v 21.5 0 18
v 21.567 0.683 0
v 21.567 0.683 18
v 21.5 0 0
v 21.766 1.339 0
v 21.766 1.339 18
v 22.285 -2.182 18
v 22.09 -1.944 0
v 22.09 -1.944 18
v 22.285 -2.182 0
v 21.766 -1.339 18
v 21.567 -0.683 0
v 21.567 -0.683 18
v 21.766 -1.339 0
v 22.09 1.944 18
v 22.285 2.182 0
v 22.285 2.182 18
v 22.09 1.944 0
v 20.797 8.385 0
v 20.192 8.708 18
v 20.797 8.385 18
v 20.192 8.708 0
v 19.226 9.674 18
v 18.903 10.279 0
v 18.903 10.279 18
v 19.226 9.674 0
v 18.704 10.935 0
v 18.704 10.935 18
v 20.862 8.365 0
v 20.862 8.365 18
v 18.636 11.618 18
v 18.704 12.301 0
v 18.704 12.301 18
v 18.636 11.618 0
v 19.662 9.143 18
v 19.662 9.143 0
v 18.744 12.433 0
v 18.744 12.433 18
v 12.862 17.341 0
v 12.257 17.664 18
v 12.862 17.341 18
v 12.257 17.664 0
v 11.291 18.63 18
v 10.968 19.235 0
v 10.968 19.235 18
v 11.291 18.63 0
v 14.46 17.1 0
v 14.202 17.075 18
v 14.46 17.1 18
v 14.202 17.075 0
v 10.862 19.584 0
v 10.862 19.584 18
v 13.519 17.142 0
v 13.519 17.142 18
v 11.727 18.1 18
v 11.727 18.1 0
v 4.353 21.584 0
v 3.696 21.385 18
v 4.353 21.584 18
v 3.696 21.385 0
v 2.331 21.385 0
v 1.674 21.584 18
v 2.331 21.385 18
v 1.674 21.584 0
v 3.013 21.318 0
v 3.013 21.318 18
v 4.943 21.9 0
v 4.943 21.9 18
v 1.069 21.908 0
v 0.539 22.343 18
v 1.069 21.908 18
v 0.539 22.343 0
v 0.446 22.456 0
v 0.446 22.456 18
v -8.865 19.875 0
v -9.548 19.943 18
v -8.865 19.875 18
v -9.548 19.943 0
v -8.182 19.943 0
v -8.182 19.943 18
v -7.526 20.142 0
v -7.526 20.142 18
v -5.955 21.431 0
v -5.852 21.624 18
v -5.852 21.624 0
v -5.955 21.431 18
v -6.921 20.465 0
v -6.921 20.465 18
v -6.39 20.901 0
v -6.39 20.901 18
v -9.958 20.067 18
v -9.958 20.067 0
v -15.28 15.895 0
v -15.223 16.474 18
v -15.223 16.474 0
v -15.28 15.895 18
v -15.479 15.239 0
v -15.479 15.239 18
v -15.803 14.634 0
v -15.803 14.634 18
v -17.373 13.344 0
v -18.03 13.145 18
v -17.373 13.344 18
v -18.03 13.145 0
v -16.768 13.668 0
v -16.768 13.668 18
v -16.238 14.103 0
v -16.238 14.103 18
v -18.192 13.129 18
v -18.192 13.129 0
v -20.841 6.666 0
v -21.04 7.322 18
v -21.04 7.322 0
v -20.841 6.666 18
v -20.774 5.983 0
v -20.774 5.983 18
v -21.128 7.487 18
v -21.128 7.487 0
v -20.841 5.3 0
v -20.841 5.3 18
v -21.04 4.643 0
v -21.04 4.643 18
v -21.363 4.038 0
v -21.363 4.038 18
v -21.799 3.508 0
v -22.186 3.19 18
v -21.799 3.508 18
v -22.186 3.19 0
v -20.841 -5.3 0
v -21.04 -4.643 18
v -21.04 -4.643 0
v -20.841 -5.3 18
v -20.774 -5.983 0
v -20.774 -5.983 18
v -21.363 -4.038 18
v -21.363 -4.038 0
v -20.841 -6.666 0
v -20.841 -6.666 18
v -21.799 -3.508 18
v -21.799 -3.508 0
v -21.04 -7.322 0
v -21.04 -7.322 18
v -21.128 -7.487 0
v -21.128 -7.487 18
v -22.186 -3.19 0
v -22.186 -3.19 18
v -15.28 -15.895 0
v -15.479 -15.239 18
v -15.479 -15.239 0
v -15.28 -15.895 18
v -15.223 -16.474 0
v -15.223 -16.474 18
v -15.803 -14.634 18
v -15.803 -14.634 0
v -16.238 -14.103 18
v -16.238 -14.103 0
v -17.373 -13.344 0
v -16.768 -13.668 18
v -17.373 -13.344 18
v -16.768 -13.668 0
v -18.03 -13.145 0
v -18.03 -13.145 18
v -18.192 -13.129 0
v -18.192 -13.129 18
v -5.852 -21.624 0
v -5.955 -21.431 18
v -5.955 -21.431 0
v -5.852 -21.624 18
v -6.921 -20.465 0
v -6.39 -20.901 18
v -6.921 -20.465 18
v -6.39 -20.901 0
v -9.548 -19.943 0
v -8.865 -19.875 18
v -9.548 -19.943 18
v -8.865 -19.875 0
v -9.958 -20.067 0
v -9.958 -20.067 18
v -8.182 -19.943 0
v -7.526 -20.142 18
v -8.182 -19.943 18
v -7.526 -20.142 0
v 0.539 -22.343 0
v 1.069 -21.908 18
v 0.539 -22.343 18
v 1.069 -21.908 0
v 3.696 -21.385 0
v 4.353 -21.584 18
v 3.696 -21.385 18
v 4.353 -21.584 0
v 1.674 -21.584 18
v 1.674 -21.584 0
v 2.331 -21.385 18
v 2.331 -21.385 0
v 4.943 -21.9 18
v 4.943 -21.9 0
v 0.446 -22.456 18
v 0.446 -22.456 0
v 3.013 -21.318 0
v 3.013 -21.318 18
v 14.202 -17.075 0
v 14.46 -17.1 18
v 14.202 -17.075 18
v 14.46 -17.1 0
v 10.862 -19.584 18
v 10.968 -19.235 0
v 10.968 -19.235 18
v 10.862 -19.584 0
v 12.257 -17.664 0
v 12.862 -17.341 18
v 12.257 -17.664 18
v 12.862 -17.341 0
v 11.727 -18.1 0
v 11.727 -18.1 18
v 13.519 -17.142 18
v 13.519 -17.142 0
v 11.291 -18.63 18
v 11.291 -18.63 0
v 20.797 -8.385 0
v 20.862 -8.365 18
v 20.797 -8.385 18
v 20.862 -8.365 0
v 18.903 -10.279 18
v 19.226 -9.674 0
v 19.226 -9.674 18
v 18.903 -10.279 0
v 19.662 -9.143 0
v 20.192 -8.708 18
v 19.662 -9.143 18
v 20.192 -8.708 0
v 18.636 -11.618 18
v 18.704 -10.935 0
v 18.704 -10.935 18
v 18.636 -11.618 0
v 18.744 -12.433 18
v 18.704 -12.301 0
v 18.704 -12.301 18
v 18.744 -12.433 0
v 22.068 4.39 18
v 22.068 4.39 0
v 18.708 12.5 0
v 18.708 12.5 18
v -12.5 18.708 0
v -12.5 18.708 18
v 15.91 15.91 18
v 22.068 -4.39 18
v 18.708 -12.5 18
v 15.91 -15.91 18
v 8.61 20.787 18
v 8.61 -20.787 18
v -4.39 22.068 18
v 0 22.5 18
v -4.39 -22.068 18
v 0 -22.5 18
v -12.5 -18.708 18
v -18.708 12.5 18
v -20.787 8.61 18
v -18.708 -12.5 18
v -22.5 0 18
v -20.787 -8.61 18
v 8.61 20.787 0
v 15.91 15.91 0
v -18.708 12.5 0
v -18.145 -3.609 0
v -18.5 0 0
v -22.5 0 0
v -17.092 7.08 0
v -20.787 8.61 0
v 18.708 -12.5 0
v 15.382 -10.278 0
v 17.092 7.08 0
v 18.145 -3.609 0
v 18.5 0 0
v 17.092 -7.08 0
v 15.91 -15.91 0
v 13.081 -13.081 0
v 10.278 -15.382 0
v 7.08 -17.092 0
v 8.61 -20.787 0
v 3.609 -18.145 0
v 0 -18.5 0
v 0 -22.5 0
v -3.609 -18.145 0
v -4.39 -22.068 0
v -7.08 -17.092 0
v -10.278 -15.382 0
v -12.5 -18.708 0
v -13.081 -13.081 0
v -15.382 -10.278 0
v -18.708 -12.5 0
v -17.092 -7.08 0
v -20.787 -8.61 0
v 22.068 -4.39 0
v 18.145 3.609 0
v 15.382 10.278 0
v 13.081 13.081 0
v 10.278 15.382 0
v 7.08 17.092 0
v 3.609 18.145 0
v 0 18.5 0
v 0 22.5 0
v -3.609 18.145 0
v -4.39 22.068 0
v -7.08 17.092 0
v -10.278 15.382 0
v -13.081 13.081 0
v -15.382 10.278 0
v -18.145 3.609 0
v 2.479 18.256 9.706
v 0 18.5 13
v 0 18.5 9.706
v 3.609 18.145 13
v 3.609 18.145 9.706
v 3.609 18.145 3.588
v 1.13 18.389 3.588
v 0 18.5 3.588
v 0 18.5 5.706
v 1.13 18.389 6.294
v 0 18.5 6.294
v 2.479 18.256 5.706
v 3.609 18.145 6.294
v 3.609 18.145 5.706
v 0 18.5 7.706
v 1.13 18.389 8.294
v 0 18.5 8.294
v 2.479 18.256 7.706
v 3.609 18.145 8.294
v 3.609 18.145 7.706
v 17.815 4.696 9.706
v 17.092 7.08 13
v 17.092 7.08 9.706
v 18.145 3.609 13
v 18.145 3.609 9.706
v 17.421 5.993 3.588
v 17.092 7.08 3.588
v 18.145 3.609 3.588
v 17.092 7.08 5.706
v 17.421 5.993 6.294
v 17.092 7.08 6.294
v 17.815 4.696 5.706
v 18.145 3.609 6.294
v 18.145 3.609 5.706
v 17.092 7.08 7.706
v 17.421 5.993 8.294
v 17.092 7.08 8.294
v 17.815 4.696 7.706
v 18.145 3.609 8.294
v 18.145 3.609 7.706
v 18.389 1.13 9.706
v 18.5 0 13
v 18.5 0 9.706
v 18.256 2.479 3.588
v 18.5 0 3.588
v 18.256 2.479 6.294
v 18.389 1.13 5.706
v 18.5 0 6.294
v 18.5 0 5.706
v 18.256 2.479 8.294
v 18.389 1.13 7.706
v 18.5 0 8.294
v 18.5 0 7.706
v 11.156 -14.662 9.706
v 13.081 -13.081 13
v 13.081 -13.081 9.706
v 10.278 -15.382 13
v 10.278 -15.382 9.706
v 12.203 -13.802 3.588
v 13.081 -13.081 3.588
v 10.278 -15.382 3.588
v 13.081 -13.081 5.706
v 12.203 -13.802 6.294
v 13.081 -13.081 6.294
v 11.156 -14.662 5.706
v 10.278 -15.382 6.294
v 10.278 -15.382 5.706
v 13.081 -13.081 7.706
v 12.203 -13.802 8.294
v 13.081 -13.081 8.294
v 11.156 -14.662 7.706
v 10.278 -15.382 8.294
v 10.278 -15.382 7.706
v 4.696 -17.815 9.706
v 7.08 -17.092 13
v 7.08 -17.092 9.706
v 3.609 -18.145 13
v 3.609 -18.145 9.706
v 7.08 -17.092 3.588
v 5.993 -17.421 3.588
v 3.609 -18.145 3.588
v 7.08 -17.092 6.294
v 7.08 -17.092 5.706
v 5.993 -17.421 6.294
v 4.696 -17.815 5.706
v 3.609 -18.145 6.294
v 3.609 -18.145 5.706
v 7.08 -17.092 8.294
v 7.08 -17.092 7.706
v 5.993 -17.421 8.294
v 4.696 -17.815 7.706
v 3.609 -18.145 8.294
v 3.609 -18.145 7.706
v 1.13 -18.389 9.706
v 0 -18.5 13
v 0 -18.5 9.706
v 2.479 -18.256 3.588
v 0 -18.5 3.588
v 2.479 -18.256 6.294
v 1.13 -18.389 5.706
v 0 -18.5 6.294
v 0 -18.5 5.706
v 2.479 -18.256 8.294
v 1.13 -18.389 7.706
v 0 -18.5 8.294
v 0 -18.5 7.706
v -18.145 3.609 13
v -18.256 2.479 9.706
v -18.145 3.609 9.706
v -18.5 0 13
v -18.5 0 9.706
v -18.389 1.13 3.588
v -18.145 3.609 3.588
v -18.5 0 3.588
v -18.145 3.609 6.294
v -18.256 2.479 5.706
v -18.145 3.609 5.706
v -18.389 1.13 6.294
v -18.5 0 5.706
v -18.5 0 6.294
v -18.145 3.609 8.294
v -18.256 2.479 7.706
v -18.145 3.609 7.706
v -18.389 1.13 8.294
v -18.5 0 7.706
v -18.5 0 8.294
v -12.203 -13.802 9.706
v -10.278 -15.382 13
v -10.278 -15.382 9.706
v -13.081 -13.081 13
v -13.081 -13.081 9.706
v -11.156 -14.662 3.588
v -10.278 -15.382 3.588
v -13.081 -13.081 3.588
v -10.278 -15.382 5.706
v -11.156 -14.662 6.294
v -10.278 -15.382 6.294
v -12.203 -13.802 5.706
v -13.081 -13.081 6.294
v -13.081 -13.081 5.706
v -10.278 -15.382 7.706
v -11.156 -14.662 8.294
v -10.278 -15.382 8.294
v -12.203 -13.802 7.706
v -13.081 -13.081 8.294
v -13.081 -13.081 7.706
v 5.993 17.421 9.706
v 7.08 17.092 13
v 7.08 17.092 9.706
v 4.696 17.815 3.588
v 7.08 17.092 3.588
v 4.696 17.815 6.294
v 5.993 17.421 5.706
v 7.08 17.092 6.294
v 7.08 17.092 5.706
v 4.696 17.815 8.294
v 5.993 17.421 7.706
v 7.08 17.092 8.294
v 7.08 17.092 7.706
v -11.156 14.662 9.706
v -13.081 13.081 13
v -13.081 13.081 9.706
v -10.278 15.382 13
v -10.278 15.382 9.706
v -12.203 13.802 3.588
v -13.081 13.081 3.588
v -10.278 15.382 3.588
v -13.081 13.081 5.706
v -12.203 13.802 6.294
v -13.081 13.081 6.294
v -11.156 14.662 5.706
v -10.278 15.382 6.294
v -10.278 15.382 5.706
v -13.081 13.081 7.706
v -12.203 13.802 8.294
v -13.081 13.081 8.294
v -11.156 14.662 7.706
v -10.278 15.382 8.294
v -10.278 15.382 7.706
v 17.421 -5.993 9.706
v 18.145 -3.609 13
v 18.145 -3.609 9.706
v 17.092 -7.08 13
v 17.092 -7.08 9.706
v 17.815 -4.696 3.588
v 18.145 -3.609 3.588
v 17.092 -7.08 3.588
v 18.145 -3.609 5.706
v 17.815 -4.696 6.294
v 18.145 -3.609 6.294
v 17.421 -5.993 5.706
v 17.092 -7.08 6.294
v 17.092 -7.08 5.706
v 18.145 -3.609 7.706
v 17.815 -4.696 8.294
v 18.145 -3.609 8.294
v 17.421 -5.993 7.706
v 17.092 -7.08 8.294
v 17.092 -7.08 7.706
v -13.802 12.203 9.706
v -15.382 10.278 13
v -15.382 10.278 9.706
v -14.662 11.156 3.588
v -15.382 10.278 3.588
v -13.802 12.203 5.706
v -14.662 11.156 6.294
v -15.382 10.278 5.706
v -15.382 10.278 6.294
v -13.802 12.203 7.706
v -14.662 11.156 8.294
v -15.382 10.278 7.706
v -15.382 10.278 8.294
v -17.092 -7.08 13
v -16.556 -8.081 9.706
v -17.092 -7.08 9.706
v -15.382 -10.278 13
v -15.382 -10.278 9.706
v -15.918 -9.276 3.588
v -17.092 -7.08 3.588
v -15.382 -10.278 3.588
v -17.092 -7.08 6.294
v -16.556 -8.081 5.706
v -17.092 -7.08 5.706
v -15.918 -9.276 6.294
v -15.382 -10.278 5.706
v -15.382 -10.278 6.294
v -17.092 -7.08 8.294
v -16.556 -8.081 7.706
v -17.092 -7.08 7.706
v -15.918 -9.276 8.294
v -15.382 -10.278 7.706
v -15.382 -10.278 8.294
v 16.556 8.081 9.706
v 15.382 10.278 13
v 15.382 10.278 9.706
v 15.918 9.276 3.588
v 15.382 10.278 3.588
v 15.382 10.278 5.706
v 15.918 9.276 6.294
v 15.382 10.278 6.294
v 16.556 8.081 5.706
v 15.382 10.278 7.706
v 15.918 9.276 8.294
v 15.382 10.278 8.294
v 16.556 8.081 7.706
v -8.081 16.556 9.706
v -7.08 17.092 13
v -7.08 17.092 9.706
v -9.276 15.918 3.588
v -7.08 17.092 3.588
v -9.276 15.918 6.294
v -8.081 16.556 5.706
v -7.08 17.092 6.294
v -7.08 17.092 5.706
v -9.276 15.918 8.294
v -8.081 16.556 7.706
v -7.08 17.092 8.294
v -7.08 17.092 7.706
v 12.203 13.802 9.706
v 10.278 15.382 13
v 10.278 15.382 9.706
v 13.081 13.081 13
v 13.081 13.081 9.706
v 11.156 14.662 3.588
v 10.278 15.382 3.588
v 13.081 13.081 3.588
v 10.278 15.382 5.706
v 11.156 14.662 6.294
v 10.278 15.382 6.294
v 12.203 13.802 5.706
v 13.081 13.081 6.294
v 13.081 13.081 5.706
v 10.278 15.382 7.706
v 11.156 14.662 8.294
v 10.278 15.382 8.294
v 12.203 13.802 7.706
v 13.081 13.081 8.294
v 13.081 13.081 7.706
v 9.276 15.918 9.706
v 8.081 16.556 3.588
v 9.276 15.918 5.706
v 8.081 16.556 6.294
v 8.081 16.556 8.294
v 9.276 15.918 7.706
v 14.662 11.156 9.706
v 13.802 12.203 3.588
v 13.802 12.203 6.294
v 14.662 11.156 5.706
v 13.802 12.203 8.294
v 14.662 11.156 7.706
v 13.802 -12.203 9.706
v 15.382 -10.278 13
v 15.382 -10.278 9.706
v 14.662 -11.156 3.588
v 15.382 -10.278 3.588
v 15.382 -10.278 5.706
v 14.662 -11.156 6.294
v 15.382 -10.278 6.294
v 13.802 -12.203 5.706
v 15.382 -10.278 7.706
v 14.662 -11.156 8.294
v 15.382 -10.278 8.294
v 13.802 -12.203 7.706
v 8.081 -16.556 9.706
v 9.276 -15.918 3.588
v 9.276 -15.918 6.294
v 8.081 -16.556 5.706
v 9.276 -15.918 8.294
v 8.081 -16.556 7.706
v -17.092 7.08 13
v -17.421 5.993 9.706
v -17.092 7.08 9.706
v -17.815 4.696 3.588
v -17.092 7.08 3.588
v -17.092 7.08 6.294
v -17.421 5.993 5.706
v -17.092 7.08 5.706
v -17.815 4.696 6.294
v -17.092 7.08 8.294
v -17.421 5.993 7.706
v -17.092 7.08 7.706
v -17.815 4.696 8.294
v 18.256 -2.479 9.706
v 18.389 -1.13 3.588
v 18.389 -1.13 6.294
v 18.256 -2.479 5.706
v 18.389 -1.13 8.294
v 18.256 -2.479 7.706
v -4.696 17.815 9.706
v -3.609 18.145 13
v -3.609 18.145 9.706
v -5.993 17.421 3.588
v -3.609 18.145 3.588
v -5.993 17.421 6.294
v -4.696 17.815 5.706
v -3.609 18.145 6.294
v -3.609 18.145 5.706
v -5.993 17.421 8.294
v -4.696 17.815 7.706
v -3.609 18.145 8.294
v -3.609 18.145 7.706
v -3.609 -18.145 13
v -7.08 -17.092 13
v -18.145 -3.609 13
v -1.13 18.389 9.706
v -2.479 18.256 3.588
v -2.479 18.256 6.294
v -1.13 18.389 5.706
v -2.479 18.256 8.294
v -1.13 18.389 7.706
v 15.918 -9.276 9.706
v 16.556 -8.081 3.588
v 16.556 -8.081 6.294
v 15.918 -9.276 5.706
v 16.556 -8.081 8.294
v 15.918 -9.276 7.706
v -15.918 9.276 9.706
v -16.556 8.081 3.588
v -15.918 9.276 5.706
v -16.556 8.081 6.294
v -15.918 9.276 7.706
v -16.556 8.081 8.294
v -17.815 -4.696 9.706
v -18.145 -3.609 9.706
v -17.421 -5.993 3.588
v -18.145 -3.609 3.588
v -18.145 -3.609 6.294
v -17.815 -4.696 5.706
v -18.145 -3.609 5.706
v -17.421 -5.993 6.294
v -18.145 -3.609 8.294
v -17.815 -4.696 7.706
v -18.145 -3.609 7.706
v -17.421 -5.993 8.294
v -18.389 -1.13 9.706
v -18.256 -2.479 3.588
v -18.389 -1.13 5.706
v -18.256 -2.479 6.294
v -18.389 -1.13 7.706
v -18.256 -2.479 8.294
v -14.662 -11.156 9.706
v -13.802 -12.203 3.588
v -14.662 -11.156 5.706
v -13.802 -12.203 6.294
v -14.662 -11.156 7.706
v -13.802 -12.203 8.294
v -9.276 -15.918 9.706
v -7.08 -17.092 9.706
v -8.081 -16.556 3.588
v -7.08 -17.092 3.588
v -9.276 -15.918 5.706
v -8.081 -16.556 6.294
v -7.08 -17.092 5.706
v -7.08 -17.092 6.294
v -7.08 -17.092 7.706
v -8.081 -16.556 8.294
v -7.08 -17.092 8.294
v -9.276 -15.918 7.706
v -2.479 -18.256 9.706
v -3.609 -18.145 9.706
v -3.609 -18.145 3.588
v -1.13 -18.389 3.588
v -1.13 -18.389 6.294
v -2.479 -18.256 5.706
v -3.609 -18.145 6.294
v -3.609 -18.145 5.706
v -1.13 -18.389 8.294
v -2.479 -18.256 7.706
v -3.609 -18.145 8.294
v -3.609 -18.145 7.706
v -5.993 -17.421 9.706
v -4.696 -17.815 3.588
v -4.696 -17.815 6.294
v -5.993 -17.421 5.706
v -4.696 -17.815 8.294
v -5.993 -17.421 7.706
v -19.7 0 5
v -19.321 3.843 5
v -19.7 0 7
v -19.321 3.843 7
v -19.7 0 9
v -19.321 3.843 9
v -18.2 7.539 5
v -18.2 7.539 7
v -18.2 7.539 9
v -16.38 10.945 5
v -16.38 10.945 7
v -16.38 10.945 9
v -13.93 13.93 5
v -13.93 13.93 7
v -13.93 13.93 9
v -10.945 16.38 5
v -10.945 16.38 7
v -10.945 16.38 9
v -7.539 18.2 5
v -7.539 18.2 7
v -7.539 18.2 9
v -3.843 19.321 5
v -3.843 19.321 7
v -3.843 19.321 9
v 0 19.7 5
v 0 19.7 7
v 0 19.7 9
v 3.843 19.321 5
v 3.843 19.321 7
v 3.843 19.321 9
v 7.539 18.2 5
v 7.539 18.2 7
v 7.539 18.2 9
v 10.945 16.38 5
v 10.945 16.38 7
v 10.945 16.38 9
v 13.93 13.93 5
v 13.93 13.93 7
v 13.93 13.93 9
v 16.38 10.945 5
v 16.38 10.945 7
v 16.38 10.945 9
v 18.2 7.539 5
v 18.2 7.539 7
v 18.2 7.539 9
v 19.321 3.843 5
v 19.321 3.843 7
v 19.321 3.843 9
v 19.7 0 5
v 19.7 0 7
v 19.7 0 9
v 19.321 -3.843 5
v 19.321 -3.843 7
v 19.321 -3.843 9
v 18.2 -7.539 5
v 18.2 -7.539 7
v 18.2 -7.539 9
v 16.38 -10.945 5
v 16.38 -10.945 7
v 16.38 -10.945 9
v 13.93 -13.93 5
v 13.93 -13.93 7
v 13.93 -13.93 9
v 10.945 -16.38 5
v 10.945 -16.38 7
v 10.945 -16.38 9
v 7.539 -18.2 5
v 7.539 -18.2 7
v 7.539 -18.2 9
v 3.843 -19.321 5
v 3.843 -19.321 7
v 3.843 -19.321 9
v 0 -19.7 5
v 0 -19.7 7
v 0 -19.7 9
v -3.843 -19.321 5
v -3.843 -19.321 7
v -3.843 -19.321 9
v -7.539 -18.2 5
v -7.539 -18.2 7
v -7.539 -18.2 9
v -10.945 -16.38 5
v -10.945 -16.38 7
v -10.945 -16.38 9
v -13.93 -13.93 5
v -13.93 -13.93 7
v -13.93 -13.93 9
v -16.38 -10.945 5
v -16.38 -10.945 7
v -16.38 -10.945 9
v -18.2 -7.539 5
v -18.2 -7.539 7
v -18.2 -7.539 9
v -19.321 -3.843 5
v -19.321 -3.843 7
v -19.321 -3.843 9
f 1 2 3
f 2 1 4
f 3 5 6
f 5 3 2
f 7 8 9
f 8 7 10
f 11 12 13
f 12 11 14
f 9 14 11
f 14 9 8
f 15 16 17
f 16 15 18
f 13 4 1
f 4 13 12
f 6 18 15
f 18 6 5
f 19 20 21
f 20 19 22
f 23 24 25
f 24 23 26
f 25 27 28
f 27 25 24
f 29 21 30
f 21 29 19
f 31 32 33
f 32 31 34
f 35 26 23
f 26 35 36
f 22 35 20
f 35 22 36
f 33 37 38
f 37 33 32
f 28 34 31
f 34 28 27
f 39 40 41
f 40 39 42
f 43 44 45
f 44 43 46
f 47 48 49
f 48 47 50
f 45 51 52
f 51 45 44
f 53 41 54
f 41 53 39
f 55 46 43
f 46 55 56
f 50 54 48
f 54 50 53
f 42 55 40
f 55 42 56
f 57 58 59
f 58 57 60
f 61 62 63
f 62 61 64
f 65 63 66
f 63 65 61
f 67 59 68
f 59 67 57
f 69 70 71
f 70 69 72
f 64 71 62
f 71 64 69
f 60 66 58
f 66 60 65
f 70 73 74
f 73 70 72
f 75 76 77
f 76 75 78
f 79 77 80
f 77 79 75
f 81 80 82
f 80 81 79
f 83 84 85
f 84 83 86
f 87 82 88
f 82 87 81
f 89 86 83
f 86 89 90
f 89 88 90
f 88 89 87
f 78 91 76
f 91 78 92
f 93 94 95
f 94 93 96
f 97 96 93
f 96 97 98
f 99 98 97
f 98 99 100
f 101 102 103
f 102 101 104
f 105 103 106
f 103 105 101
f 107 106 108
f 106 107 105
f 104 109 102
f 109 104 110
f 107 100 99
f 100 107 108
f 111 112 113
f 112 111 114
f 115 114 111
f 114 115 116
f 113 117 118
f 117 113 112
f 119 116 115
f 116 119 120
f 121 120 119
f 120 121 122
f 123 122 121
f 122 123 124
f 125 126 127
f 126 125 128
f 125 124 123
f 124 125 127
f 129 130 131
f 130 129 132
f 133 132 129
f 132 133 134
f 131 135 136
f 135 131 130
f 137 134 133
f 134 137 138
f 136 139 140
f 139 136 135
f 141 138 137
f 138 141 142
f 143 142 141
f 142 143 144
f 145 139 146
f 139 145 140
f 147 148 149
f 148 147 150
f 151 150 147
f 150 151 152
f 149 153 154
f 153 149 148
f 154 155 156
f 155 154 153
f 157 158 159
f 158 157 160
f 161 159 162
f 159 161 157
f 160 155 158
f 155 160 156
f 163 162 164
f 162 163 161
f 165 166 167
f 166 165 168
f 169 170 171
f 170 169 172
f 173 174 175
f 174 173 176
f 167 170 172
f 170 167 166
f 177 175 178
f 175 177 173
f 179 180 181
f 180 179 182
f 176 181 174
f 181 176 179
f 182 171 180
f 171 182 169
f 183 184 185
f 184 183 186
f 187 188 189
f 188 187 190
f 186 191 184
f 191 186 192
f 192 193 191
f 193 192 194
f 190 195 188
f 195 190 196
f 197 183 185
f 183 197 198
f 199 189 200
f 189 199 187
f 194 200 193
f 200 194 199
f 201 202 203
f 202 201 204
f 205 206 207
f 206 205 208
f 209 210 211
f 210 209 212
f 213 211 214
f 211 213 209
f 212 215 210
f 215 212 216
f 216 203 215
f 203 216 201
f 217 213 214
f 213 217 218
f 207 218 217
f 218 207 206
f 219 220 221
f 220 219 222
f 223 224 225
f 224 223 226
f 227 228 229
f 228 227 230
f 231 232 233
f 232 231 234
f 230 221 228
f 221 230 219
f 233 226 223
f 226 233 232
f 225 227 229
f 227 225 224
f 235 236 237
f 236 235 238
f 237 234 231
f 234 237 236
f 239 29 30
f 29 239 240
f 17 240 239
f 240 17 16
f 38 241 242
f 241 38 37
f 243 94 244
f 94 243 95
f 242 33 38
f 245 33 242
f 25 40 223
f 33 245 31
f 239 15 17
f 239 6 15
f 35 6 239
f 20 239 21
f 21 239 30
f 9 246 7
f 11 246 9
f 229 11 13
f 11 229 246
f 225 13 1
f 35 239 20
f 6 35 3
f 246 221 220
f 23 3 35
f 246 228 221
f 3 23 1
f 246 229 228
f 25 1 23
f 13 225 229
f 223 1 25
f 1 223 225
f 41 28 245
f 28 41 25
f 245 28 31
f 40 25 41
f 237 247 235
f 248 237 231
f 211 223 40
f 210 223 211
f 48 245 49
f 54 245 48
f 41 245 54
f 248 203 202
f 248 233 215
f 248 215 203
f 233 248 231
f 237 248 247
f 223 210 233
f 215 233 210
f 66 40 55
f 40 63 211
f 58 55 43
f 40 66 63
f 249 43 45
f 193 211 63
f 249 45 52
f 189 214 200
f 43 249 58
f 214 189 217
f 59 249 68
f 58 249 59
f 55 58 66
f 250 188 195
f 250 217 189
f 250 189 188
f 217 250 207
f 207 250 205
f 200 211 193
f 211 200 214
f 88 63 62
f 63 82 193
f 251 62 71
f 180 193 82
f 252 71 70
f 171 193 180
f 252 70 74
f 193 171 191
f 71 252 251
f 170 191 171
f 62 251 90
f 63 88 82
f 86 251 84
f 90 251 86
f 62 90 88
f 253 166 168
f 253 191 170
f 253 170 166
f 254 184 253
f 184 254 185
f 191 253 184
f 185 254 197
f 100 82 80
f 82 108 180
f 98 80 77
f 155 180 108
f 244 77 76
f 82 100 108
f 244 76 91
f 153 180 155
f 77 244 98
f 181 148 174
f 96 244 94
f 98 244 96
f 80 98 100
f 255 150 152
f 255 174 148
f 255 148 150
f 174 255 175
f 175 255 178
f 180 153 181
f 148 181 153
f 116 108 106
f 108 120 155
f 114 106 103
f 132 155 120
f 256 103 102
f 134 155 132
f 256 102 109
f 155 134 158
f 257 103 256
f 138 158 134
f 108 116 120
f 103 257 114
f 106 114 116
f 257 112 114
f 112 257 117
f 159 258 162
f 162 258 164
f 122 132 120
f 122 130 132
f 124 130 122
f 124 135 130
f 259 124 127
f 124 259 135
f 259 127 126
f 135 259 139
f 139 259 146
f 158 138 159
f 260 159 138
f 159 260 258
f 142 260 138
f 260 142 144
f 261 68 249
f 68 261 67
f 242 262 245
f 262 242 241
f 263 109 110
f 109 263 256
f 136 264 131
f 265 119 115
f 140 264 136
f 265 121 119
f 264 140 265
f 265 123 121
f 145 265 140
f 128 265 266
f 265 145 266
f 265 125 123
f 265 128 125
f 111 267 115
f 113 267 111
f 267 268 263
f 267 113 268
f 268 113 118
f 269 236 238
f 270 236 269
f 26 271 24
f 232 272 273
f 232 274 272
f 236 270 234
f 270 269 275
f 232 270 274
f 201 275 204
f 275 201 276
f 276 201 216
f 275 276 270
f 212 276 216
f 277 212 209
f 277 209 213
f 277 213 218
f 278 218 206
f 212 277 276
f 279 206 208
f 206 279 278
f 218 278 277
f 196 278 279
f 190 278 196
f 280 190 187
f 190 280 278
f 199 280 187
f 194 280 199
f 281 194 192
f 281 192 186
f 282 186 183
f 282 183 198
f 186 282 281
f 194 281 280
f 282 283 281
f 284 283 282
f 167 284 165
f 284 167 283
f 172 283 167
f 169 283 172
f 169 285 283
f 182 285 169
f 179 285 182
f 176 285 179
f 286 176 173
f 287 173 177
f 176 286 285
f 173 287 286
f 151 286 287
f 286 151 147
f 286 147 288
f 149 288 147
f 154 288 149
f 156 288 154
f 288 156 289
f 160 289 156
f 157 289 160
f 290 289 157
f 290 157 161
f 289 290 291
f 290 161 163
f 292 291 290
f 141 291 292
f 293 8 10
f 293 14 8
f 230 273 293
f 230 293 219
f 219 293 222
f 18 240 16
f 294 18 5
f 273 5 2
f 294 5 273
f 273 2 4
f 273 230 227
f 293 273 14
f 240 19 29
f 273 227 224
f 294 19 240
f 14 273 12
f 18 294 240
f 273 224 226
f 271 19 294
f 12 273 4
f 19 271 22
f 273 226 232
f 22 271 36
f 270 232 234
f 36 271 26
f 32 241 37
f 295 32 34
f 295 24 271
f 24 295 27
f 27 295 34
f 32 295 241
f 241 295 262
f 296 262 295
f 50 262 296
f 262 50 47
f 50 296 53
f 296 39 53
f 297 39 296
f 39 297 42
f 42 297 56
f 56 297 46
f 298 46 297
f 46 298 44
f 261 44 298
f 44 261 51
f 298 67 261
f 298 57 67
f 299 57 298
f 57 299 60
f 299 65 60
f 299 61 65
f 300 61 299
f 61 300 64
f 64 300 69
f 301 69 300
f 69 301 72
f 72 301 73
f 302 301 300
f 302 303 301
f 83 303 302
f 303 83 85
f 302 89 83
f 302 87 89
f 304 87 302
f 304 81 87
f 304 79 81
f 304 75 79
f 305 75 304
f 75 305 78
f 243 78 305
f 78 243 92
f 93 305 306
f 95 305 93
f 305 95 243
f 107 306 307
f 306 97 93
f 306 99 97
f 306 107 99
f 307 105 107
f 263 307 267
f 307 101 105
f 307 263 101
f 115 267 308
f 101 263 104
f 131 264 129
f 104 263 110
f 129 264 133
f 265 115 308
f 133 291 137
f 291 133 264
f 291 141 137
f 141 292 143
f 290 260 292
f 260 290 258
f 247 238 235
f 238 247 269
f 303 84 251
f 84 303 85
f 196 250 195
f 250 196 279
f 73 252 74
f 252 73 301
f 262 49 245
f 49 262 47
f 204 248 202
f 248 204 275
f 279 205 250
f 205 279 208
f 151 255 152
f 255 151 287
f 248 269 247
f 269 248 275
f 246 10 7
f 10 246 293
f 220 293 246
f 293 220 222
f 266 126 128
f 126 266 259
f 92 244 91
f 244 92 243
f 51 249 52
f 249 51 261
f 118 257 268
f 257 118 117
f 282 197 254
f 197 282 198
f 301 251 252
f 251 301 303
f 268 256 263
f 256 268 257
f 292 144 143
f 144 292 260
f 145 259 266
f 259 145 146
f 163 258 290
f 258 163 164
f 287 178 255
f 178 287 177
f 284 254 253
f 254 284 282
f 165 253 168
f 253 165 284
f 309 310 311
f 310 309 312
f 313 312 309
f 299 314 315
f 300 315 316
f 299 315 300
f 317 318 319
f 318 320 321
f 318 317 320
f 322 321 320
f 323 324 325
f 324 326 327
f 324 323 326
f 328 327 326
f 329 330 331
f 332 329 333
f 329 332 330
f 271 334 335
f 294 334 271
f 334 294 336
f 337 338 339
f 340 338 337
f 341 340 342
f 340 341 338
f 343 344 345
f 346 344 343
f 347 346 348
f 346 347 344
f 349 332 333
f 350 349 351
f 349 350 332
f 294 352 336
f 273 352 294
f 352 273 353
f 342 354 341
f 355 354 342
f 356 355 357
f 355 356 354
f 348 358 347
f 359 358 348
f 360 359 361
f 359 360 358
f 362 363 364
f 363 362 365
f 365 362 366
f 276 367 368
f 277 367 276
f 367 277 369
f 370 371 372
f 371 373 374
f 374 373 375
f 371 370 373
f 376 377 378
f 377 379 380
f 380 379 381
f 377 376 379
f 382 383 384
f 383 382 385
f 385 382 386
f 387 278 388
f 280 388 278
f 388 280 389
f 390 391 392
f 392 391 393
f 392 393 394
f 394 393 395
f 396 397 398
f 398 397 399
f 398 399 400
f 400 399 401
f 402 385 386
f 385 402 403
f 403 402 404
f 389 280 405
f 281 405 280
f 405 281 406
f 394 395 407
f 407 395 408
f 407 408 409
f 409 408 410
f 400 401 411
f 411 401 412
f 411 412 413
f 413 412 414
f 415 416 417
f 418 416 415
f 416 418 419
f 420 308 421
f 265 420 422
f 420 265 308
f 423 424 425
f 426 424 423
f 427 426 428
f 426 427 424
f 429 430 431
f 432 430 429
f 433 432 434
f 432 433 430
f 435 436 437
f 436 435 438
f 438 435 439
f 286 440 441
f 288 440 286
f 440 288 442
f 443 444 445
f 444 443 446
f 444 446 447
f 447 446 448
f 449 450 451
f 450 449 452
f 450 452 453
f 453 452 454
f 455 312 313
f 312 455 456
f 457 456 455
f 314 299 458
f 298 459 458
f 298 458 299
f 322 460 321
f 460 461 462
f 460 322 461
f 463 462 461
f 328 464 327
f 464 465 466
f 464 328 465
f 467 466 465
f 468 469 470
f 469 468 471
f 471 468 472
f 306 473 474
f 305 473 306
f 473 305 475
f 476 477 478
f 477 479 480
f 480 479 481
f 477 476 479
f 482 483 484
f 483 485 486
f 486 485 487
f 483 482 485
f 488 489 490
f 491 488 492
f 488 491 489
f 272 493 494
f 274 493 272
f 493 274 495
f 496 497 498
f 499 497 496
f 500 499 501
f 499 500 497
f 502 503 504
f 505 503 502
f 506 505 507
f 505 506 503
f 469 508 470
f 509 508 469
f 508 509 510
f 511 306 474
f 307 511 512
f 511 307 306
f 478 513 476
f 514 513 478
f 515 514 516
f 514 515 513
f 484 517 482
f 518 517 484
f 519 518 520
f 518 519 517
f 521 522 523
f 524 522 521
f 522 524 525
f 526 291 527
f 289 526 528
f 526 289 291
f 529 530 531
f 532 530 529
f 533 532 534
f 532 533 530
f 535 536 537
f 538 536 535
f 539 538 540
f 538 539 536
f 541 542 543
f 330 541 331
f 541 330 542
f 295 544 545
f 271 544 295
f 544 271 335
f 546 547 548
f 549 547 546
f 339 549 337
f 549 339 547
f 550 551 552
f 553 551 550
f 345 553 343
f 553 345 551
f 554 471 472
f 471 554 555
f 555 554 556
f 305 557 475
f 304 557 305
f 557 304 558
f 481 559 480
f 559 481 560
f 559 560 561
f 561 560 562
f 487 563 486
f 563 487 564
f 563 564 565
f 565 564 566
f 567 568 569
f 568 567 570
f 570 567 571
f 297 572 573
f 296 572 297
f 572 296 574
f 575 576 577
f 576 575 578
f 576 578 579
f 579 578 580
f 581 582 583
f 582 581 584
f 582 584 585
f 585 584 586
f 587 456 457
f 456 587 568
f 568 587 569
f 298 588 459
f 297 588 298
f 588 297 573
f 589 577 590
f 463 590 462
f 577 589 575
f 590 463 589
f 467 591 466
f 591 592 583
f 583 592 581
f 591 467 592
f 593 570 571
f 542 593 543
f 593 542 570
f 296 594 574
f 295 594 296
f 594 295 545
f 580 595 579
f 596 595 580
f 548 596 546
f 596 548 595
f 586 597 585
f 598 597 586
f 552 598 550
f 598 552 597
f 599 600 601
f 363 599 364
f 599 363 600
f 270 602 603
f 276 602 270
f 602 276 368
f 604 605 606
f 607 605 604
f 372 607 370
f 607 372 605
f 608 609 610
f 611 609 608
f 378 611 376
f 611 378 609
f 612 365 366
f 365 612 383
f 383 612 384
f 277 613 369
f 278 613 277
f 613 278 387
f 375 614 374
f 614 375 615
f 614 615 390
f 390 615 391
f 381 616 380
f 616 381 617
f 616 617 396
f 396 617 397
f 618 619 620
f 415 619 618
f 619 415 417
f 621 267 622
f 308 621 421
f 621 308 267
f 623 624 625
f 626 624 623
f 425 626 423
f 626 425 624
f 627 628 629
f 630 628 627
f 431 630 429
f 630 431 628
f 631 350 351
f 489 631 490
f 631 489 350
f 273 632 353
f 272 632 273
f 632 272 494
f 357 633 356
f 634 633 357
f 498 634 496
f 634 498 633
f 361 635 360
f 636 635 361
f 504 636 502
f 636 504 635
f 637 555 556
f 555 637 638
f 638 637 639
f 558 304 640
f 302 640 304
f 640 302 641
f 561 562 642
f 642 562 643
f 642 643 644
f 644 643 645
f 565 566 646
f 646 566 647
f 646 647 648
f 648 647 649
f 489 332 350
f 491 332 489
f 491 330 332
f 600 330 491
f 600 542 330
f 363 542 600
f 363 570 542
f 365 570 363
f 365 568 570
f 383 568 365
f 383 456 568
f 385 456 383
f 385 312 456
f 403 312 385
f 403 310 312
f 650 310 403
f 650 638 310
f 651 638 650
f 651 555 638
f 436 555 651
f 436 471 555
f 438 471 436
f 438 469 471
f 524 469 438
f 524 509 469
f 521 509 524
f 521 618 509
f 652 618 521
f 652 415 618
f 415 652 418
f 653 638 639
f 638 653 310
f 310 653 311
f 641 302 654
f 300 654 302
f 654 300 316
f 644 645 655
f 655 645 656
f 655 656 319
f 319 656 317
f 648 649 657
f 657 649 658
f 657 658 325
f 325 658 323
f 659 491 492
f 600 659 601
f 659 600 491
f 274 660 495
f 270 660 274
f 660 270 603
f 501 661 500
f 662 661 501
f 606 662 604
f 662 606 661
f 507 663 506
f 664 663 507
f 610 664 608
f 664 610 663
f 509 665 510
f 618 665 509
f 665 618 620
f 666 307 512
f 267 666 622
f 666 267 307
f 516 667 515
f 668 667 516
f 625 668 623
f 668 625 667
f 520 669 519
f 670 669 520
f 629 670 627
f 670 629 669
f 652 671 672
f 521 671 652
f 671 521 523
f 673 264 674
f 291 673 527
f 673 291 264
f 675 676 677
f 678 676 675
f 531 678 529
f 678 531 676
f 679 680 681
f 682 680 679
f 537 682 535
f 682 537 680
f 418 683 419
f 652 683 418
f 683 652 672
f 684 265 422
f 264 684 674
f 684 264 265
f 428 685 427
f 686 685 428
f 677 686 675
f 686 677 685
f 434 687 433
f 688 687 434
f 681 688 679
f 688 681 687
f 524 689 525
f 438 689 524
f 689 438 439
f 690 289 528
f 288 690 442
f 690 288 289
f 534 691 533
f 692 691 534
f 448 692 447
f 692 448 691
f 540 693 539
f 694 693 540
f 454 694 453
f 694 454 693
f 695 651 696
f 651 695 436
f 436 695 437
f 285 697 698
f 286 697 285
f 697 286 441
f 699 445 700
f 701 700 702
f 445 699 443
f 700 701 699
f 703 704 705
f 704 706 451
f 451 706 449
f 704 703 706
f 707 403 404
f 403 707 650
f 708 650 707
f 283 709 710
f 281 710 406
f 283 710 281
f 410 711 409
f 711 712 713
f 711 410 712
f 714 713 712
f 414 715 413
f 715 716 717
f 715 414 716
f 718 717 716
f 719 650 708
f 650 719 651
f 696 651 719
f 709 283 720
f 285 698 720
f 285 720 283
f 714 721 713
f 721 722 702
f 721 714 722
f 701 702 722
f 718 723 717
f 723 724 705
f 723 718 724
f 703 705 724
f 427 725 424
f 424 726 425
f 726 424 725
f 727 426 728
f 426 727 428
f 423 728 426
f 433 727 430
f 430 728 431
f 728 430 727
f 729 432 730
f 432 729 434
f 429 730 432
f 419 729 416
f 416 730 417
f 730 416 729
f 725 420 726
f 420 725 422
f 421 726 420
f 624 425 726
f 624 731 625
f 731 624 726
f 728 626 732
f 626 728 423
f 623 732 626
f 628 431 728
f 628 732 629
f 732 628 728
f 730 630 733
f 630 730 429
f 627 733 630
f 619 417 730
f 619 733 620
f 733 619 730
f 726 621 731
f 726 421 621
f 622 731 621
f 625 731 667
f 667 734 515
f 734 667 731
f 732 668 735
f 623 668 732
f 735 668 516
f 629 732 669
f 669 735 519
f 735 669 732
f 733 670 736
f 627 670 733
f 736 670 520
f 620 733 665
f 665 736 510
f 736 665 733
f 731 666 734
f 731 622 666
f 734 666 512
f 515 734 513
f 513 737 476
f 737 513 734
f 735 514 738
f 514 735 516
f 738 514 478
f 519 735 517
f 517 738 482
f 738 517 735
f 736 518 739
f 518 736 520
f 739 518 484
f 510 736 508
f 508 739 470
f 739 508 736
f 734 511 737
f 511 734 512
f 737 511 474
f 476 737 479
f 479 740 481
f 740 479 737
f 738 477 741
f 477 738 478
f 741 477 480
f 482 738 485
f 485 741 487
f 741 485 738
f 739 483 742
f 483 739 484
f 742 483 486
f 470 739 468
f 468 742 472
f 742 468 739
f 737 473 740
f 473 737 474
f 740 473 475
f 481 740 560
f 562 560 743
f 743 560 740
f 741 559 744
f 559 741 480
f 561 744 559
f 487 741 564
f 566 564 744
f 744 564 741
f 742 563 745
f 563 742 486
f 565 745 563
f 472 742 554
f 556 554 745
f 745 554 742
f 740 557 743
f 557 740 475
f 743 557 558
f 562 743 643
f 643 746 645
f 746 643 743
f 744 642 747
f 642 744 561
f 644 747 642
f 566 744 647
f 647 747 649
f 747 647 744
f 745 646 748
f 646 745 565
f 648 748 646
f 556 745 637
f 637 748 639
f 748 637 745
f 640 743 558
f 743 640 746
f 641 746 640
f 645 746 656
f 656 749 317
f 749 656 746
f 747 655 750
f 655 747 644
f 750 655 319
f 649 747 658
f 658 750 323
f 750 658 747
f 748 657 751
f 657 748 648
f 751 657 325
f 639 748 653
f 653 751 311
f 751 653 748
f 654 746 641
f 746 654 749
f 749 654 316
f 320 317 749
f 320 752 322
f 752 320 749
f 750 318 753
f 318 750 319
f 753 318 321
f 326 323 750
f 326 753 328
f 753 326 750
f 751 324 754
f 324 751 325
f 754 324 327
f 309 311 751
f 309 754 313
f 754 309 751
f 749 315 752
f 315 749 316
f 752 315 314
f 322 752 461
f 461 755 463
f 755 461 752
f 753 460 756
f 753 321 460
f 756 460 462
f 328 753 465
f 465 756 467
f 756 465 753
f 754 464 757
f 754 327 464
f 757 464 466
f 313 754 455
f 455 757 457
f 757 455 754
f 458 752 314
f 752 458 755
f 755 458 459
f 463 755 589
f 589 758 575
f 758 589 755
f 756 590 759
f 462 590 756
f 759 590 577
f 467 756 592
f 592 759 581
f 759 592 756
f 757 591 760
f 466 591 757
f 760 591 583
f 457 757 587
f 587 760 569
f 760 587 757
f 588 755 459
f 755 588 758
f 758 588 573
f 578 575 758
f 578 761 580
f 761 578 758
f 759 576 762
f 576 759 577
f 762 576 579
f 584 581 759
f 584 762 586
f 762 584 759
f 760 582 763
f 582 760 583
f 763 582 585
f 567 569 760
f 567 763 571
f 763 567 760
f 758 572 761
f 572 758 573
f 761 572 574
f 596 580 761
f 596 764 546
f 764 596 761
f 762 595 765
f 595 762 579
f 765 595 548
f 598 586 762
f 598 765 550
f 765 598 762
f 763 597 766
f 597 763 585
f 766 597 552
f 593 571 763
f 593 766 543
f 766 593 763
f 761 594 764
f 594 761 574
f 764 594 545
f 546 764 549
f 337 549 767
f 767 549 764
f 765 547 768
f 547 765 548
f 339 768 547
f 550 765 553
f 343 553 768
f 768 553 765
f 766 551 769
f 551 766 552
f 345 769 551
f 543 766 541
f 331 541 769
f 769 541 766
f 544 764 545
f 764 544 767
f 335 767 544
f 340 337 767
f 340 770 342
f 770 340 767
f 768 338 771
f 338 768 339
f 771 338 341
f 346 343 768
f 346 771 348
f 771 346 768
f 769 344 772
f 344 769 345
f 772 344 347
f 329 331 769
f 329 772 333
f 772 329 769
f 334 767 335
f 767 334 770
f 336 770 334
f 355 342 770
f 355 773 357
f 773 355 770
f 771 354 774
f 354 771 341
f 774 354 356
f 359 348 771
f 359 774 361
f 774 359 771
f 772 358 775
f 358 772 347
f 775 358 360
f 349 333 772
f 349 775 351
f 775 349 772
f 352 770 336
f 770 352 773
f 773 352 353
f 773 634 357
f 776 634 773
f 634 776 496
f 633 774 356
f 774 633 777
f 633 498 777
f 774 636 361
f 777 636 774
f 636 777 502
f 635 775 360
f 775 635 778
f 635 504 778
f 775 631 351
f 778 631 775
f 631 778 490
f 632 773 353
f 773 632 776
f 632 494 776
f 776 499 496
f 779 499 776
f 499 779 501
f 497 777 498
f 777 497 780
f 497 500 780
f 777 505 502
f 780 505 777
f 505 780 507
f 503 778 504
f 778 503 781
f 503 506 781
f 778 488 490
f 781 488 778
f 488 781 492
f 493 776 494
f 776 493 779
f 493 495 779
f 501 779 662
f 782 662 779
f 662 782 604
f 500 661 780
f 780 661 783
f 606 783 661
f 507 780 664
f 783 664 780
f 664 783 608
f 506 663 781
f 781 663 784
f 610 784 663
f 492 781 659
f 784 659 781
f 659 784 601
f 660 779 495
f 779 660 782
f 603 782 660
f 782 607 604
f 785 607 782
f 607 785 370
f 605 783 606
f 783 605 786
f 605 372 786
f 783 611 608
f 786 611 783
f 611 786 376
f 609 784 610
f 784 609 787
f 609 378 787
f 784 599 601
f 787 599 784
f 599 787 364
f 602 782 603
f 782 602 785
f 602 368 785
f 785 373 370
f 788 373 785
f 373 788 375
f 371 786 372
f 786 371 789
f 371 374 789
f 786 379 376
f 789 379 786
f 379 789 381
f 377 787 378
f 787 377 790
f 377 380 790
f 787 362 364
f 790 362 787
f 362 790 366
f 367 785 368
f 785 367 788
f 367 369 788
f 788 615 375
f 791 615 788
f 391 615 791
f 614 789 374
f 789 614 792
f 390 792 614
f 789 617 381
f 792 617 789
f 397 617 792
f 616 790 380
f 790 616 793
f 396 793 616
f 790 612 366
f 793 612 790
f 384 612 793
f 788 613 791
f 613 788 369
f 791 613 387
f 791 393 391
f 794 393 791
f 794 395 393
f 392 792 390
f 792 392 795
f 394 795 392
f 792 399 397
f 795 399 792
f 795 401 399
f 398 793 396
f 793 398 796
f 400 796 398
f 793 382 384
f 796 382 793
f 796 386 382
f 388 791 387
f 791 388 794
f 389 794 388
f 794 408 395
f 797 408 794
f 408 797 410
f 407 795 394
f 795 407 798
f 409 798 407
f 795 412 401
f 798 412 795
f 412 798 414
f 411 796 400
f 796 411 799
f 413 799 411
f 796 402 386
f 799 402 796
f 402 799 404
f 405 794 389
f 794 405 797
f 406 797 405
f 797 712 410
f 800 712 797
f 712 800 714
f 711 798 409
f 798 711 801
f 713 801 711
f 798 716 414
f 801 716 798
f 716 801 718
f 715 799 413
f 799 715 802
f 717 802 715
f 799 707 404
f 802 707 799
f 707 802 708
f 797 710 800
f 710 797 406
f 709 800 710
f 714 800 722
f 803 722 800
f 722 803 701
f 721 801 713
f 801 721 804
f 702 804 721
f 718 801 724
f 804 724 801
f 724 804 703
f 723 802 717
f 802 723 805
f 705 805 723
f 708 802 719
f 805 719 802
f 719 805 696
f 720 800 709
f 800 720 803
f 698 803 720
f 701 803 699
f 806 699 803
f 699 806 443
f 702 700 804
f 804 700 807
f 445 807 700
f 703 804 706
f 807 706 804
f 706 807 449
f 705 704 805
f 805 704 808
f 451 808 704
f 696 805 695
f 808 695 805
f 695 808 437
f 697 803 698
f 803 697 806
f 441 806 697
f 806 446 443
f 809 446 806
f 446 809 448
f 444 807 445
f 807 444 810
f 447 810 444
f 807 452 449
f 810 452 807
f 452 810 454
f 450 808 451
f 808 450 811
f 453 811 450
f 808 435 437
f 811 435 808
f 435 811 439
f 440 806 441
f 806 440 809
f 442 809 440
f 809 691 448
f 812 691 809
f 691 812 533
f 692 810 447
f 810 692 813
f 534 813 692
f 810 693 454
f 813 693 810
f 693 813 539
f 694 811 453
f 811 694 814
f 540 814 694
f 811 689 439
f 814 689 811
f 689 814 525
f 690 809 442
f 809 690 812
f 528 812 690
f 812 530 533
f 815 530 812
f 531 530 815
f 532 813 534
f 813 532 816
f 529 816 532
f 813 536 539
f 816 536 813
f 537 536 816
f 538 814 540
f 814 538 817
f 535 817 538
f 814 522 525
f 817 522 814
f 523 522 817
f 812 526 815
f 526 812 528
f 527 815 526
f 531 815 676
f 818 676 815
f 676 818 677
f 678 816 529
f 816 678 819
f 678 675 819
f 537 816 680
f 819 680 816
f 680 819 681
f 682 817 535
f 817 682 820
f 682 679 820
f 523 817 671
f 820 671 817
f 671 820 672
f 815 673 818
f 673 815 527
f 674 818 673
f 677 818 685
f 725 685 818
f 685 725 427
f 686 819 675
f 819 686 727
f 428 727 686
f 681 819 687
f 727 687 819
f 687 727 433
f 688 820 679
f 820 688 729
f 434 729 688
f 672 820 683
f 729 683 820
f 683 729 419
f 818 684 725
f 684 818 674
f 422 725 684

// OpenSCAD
$fn = 32;

// ----------------------------------------------------------------------
// Threaded cap: 45 mm body, 18 mm tall, 37 mm threaded bore
// ----------------------------------------------------------------------

// --- parameters (mm) ---
outer_d = 45;             // cap outside diameter
body_h = 18;              // cap height
top_t = 5;                // closed top thickness
bore_d = 37;              // bore core diameter
pitch = 2;                // thread pitch
thread_d = 1.2;           // thread depth
thread_z = 3;             // thread start above the rim
thread_h = 7;             // threaded height
flutes = 13;              // number of knurl flutes
flute_d = 7;              // flute cutter diameter
flute_depth = 1;          // flute depth into the rim

difference() {
  union() {
    cylinder(h = 18, d = outer_d);
  }
  /* threaded bore, closed at the top */
  translate([0, 0, -2.5]) cylinder(h = 15.5, d = bore_d);
  translate([0, 0, 3]) rotate_extrude() polygon([[17.5, 0], [17.5, 7], [18, 7], [19.7, 6], [18, 5], [19.7, 4], [18, 3], [19.7, 2], [18, 0], [17.5, 0]]);
  /* knurl flutes around the rim */
  for (i = [0 : flutes - 1]) {
    a = i * 360 / flutes;
    translate([(outer_d / 2 + flute_d / 2 - flute_depth) * cos(a), (outer_d / 2 + flute_d / 2 - flute_depth) * sin(a), -2.5]) cylinder(h = body_h + 5, d = flute_d);
  }
}
